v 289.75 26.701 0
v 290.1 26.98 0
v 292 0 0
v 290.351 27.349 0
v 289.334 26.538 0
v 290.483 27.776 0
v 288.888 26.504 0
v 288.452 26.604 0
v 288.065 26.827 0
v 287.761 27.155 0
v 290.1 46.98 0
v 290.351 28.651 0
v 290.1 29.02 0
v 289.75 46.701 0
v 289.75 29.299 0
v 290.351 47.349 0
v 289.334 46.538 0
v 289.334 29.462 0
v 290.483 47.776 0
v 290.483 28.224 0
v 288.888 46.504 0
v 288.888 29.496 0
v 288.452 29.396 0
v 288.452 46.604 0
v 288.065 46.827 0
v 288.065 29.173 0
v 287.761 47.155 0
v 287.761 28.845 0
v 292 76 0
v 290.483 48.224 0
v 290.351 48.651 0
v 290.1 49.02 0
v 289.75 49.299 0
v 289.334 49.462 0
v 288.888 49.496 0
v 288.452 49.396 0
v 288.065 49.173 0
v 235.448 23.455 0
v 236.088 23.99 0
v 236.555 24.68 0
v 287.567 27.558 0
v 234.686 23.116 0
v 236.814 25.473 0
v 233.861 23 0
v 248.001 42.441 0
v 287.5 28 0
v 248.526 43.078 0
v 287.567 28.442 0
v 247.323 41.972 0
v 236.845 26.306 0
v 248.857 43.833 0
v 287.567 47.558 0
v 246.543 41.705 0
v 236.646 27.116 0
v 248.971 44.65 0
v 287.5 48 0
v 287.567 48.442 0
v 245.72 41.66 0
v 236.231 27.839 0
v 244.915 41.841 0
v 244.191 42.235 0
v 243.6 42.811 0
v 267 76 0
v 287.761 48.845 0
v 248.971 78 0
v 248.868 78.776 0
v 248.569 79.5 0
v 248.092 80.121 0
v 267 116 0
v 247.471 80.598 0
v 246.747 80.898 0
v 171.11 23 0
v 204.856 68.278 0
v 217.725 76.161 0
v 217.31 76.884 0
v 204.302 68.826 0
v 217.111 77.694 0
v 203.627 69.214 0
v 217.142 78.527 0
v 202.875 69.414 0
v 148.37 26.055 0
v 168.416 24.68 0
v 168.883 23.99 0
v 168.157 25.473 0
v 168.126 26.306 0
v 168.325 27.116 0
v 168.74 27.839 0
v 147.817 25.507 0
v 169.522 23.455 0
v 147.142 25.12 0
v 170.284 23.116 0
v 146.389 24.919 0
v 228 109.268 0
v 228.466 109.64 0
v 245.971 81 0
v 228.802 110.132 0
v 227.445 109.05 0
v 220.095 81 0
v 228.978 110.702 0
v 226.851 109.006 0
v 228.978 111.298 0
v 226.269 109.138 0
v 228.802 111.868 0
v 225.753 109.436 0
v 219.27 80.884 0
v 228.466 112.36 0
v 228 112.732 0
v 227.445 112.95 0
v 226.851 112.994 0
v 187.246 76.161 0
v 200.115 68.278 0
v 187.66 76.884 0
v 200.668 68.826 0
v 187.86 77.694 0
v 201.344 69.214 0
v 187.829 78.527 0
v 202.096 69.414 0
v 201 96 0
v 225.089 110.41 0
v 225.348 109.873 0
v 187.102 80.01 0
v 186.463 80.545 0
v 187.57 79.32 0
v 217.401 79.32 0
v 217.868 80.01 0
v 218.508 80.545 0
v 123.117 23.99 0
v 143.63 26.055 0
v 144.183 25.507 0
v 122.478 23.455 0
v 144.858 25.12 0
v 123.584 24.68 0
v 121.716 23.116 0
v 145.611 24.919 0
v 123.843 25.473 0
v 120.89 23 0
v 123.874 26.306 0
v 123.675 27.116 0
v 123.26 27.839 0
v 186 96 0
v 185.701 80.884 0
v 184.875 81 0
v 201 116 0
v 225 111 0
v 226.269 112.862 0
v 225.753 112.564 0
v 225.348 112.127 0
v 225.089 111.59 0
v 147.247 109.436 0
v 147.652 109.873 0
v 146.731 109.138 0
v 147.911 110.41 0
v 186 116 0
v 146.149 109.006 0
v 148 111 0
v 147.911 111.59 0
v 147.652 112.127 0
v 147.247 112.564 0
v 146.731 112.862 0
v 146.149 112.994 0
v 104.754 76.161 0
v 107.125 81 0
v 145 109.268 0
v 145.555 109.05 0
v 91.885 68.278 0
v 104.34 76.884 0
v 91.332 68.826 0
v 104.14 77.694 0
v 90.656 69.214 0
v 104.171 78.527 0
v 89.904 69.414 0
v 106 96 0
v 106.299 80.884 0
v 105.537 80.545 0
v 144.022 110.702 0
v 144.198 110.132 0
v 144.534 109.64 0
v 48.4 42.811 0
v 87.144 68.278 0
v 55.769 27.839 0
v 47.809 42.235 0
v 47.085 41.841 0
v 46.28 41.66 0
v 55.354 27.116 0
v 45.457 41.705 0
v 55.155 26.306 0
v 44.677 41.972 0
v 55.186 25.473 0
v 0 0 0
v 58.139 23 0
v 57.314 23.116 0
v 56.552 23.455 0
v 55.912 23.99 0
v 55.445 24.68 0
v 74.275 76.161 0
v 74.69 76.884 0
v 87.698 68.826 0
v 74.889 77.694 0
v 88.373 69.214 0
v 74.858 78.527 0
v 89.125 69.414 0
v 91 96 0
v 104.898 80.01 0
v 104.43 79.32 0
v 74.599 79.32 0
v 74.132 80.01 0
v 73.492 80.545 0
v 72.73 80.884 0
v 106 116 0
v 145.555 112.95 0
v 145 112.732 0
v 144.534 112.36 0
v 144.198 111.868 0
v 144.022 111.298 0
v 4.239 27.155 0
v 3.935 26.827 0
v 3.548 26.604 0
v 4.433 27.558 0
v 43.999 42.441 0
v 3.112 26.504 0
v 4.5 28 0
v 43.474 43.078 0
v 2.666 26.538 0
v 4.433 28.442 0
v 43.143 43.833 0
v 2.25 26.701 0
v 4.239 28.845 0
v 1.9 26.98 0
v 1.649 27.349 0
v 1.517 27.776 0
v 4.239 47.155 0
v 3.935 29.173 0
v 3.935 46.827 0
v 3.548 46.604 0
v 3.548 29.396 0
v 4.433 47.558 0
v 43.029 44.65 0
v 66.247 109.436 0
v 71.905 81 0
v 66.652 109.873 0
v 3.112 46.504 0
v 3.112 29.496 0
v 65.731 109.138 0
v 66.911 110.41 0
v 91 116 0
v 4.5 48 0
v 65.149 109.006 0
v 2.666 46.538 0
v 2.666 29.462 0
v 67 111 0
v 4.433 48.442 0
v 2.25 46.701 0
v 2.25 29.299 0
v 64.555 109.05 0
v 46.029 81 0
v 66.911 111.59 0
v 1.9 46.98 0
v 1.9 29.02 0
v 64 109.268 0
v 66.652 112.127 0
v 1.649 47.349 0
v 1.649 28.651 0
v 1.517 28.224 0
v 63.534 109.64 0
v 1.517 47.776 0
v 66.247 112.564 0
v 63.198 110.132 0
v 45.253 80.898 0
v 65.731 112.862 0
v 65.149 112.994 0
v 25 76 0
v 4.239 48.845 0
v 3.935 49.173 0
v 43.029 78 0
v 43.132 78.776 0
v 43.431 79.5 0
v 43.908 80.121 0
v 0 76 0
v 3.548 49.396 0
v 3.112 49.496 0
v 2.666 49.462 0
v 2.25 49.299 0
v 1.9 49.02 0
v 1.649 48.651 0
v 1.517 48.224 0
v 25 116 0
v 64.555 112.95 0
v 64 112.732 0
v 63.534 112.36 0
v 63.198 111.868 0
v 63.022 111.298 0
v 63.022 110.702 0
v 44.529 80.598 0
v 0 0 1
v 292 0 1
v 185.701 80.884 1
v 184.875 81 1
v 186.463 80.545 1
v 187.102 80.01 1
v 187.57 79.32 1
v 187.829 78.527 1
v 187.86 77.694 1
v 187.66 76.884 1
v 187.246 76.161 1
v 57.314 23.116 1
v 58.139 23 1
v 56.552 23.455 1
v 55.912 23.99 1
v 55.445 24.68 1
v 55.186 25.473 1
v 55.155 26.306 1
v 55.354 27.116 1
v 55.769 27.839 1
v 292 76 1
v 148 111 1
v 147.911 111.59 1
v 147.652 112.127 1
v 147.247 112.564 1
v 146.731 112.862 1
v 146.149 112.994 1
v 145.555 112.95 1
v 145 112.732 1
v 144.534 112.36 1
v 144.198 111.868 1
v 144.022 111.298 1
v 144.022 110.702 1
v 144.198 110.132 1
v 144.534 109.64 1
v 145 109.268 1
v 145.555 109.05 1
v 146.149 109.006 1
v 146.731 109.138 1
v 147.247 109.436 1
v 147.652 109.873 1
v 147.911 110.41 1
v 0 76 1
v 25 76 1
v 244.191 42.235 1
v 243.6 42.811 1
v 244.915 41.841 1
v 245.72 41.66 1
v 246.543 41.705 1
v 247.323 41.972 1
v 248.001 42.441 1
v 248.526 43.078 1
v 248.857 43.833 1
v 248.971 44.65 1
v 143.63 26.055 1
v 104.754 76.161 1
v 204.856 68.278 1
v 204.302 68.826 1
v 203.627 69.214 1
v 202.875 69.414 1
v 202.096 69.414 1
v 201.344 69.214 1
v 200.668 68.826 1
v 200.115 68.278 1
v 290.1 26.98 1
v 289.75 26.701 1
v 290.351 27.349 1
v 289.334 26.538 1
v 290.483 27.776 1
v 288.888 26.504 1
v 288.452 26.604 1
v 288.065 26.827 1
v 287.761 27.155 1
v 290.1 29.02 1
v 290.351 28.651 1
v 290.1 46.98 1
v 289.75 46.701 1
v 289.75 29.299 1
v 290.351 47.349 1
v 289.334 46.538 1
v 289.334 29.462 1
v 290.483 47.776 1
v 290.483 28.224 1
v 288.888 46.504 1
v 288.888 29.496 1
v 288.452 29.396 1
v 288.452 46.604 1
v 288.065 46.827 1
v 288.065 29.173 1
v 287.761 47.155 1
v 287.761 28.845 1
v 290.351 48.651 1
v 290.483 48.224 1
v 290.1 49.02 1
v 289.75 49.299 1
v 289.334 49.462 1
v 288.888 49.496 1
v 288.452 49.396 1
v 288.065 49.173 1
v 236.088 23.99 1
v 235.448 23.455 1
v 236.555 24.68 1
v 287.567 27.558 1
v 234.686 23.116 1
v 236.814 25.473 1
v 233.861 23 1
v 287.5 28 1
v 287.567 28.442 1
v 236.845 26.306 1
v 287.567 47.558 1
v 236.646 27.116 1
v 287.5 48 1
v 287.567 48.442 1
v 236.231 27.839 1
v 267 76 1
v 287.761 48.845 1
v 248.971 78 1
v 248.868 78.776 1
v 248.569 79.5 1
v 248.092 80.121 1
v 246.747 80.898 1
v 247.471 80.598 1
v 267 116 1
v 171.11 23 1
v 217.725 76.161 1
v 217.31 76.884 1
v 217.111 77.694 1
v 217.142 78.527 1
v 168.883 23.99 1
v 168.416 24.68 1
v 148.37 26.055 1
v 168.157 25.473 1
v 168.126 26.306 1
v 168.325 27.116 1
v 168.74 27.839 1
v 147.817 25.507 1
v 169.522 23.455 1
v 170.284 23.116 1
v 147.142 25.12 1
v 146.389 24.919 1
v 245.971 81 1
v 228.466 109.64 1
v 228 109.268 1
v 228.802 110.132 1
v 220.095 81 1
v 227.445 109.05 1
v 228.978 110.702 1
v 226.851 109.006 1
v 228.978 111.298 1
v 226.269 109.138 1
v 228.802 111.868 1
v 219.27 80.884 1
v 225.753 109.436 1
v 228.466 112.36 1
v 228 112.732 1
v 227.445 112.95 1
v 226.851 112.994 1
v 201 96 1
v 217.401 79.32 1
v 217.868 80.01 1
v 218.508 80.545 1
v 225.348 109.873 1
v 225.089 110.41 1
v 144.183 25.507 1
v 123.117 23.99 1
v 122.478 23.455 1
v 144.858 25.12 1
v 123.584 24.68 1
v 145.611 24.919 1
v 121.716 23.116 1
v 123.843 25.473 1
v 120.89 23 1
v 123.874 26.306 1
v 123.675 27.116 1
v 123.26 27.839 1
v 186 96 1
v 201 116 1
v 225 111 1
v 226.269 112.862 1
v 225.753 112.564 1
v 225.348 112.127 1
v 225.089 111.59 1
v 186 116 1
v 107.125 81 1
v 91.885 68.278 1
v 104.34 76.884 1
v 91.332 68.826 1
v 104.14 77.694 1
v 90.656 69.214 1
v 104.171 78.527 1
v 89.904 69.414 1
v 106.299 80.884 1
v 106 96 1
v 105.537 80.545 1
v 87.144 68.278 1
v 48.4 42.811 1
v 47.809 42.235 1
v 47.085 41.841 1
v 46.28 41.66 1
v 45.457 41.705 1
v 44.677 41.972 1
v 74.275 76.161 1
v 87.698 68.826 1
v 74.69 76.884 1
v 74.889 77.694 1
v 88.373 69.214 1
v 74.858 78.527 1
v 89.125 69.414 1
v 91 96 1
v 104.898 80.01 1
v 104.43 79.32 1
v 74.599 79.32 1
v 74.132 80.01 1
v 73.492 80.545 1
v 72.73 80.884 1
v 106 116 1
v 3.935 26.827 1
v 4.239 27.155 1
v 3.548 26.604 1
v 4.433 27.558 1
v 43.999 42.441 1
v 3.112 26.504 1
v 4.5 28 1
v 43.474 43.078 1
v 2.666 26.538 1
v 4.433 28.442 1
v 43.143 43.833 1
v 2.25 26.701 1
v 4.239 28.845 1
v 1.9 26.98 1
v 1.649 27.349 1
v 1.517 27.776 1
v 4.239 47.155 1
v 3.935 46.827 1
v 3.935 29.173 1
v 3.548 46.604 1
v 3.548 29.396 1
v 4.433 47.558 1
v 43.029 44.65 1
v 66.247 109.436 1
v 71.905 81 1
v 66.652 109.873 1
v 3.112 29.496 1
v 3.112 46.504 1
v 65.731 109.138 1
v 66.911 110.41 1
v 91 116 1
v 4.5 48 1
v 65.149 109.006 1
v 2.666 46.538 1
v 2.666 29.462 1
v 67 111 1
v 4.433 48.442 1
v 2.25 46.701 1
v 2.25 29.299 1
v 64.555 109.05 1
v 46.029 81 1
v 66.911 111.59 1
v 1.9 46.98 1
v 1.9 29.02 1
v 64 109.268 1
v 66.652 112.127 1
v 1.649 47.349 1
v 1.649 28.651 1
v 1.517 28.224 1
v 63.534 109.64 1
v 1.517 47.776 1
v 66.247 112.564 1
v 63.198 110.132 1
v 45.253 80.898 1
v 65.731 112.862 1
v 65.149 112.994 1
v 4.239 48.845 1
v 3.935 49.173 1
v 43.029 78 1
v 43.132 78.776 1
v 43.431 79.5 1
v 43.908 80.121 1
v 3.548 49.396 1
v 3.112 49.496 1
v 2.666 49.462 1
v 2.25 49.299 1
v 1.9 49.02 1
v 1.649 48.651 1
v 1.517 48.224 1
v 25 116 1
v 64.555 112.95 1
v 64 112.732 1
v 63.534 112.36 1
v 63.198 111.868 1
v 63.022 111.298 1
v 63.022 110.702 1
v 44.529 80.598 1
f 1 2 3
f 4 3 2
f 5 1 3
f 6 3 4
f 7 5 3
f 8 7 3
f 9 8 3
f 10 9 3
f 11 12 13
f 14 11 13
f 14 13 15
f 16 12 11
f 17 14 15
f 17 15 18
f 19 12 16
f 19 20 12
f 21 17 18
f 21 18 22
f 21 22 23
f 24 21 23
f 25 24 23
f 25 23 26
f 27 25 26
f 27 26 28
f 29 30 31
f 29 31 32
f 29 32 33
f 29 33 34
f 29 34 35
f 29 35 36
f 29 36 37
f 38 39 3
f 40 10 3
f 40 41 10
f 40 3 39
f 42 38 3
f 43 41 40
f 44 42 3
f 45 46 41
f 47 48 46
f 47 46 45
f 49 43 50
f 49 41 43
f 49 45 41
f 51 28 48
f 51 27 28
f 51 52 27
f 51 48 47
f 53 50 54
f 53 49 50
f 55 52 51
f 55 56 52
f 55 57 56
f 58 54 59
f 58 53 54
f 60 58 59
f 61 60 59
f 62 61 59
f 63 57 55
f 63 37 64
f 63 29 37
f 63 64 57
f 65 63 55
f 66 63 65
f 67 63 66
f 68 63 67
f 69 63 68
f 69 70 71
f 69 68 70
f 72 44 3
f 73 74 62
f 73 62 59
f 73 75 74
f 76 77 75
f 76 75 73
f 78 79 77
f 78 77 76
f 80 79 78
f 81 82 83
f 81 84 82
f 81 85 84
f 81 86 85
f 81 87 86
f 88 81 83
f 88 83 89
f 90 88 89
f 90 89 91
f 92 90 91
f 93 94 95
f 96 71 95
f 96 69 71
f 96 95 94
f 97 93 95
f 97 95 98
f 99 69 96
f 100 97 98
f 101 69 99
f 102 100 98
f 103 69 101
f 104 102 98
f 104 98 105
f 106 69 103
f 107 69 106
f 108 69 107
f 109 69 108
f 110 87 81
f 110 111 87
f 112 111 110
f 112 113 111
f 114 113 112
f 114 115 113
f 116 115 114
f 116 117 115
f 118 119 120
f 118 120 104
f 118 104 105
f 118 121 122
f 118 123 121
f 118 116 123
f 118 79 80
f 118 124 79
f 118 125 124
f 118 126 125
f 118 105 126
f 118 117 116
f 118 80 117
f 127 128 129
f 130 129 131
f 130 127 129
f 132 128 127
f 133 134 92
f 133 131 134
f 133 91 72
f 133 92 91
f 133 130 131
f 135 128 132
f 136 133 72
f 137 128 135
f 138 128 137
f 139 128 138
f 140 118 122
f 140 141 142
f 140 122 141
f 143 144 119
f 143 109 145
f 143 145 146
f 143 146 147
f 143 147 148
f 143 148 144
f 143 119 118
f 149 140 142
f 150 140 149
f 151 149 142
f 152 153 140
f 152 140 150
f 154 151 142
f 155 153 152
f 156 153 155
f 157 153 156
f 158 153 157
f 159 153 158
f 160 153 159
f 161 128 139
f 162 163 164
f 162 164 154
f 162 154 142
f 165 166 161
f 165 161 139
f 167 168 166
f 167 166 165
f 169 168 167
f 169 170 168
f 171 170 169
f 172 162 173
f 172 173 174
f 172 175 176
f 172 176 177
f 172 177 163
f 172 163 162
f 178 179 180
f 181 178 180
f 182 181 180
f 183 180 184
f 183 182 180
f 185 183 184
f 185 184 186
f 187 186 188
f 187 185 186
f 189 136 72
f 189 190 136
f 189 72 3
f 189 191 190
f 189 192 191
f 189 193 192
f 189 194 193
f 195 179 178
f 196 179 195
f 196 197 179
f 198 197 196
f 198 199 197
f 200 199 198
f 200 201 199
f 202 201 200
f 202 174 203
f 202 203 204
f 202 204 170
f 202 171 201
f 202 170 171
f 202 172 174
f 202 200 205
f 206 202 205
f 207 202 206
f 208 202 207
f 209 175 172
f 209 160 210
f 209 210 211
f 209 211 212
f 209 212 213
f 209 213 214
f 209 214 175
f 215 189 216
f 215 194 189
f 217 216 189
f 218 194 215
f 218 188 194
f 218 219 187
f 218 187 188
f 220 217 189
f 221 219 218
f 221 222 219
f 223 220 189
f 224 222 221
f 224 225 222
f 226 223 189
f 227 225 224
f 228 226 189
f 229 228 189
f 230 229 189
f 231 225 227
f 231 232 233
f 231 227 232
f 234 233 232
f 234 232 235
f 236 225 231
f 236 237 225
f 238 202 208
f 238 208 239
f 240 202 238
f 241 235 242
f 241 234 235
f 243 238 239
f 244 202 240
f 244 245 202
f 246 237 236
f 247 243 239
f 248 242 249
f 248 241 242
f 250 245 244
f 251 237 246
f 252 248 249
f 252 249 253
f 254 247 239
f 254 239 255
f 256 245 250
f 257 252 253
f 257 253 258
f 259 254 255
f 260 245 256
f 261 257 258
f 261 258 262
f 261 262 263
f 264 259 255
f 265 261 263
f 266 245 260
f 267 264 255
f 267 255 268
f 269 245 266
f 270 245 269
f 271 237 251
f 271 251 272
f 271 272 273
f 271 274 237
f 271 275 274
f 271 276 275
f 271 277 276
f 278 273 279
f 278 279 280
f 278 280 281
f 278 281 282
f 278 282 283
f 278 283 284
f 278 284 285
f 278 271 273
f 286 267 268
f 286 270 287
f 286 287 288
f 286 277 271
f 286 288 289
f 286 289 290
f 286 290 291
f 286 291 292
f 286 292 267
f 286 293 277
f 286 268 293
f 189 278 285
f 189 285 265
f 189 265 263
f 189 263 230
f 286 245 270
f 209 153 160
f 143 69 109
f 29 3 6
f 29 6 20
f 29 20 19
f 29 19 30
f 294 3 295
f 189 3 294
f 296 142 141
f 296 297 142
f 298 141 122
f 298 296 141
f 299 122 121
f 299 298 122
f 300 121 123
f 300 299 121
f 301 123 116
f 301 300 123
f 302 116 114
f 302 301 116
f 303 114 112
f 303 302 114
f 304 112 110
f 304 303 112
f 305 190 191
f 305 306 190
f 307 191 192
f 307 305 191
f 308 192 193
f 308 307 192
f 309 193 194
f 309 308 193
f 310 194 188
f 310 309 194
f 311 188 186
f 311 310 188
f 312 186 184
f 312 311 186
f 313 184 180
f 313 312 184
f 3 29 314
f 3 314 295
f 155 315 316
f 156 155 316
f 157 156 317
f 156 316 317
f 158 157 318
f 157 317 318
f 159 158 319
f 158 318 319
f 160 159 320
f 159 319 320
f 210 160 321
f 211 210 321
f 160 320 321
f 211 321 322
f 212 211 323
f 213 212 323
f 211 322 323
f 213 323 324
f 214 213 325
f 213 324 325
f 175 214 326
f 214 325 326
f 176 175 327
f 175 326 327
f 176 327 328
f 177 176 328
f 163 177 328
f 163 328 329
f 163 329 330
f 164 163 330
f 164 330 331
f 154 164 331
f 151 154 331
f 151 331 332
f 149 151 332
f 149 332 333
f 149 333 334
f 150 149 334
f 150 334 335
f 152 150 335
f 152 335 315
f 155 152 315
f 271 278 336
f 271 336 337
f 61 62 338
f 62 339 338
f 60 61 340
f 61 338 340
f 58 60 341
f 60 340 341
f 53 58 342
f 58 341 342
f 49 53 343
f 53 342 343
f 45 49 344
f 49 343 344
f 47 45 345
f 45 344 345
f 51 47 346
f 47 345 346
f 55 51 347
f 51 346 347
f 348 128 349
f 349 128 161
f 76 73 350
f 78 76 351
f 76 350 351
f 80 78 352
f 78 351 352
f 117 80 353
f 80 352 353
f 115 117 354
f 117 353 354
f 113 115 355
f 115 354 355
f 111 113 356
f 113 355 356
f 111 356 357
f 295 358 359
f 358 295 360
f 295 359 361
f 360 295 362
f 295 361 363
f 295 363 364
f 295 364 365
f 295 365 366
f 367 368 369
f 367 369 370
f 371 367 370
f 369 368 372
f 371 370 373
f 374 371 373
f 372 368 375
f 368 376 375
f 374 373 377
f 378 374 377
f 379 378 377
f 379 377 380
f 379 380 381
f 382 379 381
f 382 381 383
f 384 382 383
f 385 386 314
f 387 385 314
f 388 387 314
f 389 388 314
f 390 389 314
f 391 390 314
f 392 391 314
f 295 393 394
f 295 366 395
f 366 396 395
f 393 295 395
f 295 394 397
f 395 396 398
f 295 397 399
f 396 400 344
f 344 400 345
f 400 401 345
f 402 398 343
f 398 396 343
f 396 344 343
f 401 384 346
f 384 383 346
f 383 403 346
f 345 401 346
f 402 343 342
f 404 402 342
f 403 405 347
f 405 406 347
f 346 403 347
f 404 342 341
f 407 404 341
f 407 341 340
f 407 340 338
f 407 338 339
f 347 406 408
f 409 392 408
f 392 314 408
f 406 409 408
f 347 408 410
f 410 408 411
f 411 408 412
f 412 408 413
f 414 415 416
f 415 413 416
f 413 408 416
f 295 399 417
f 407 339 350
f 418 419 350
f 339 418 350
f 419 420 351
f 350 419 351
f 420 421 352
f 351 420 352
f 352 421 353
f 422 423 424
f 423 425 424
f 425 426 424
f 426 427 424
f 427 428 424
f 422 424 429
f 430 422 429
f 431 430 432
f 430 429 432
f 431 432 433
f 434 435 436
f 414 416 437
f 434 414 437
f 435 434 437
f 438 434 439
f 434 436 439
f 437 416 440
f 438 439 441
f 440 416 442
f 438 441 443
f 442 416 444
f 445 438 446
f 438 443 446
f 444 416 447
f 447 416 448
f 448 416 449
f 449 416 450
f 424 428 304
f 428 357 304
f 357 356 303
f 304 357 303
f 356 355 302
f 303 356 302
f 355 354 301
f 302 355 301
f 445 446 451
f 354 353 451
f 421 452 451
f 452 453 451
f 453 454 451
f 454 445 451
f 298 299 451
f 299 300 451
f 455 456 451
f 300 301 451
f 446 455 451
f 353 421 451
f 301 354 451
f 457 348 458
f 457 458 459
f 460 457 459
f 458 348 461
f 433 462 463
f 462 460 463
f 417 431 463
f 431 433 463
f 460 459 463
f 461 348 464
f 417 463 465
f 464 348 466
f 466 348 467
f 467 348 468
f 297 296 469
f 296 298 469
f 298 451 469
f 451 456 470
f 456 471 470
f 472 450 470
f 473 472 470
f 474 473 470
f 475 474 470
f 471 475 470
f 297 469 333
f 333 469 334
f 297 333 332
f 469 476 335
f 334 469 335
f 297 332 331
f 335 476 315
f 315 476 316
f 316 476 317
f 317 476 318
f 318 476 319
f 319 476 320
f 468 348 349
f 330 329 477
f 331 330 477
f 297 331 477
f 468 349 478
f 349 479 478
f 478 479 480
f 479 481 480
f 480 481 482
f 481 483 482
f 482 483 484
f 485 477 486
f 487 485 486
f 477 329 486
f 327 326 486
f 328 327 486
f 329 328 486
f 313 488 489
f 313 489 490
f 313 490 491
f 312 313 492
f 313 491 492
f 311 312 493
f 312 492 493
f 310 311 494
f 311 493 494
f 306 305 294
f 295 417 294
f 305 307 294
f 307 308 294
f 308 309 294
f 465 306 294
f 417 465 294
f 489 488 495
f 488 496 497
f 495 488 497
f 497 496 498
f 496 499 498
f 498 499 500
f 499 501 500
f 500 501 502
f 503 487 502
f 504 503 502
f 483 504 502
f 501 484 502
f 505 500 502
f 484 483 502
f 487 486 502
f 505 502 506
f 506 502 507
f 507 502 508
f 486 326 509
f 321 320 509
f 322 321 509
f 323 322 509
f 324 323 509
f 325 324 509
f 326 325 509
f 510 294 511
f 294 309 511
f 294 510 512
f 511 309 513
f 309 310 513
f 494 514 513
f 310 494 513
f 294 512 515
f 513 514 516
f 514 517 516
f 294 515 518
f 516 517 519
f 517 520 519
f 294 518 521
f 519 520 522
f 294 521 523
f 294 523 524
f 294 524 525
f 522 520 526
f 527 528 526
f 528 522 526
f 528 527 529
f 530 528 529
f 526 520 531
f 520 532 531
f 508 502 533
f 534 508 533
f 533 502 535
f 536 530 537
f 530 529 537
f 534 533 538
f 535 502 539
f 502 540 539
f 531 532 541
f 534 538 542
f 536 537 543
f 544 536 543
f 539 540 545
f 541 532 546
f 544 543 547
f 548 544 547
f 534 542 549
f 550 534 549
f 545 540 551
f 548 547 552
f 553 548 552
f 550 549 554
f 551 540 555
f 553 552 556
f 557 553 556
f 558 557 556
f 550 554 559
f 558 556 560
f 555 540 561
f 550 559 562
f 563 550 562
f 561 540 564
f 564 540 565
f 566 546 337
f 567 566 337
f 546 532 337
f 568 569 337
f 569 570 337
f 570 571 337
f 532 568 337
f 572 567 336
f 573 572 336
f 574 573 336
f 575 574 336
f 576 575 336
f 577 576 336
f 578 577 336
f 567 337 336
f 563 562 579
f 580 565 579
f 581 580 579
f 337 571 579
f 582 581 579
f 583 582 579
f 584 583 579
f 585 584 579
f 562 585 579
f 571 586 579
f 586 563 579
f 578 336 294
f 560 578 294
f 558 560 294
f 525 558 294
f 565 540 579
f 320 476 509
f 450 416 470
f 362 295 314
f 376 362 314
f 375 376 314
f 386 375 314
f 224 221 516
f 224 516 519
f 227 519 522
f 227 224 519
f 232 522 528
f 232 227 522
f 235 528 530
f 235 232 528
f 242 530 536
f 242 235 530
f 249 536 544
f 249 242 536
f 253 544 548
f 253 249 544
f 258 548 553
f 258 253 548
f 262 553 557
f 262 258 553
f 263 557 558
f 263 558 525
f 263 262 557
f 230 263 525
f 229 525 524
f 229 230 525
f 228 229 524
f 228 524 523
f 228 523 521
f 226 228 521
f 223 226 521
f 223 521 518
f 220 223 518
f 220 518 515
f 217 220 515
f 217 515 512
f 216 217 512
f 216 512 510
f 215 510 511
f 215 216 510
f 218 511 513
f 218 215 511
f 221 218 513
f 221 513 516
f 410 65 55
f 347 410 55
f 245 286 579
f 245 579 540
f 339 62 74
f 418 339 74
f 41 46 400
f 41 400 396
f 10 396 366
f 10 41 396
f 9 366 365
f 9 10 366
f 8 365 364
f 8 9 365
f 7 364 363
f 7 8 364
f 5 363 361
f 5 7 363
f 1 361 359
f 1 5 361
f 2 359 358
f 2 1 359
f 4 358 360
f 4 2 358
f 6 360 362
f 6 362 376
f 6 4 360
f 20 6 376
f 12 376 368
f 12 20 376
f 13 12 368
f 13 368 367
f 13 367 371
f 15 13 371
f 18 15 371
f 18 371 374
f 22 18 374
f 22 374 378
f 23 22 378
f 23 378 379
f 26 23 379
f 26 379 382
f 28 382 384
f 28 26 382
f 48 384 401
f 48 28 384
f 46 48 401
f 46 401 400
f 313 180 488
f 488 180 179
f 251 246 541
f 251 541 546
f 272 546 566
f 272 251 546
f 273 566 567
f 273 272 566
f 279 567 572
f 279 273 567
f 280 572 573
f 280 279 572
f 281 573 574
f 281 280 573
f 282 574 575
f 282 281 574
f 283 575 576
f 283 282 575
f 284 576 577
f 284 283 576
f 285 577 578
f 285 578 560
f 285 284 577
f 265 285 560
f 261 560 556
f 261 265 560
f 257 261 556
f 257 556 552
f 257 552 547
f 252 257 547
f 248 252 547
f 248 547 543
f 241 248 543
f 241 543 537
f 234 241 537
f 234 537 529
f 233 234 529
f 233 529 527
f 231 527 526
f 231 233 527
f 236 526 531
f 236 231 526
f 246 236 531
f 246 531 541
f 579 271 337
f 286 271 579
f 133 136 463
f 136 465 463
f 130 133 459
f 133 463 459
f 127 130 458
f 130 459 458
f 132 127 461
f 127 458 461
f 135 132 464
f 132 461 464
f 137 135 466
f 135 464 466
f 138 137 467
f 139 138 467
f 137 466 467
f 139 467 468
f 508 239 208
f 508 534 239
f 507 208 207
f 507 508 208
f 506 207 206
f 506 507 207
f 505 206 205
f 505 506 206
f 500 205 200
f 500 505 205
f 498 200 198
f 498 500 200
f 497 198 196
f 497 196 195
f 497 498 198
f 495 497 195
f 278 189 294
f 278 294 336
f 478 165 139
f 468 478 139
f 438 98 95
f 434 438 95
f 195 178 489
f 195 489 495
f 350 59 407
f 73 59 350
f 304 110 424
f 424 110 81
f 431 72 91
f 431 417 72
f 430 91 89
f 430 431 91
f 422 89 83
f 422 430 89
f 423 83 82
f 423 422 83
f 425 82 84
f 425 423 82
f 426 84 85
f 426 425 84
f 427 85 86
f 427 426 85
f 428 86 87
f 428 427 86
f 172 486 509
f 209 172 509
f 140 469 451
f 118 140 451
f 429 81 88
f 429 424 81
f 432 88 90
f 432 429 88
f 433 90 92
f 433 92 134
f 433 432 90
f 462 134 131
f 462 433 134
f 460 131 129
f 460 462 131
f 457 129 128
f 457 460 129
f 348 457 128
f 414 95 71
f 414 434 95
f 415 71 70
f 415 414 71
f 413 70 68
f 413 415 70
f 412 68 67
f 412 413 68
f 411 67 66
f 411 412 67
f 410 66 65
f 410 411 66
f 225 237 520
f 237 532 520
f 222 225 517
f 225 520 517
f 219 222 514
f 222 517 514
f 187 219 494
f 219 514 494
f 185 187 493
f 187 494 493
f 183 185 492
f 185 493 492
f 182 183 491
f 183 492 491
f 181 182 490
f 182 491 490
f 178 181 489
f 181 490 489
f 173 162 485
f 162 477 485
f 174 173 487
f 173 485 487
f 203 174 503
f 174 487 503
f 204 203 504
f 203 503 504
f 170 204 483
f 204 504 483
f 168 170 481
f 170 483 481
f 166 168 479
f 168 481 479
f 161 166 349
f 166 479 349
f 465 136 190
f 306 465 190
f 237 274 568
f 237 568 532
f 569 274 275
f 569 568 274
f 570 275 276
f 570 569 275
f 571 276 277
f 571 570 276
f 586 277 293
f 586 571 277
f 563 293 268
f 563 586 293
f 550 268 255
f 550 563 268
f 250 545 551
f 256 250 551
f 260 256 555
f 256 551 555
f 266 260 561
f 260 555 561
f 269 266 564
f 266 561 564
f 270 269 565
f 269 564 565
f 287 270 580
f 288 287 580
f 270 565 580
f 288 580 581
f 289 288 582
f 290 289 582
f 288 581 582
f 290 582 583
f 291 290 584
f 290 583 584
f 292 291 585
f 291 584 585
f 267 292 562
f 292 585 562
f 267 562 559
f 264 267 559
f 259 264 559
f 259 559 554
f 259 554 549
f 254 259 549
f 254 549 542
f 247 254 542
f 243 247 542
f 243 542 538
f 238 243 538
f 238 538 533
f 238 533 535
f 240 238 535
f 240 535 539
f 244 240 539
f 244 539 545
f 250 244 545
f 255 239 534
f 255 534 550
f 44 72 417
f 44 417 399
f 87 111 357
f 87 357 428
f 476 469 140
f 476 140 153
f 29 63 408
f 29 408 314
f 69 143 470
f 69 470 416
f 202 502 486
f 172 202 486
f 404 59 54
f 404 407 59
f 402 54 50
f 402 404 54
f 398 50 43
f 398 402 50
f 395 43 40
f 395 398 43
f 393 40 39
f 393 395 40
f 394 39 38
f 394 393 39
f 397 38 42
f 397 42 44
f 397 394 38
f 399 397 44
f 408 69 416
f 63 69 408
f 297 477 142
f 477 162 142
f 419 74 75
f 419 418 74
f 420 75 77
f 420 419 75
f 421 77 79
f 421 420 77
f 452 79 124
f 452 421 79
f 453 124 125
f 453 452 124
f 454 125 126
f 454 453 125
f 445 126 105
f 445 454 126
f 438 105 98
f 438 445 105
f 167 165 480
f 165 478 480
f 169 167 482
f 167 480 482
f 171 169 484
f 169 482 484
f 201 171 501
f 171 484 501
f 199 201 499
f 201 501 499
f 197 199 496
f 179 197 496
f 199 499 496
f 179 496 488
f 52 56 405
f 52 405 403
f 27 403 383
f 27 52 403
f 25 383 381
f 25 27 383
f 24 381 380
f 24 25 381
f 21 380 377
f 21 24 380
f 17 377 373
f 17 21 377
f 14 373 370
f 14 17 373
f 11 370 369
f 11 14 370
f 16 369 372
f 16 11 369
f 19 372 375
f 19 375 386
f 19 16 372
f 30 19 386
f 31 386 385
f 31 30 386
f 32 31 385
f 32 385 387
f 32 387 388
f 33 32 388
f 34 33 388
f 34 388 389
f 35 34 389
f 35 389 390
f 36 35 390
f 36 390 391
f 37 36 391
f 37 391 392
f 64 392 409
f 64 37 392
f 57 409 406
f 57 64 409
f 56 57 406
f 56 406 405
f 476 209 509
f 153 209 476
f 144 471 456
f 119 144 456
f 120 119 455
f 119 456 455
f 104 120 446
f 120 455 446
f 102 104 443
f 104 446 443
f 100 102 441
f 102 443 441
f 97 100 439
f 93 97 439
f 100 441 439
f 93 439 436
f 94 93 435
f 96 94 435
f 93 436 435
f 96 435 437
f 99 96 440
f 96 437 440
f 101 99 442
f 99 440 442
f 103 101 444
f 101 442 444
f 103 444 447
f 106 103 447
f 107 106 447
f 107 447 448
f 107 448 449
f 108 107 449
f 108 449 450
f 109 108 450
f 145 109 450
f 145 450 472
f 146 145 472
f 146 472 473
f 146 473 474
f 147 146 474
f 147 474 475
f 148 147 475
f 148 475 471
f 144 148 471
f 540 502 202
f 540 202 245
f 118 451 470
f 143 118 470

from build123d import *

# Parameters (mm, degrees)
SKETCH_1_R          = 1.5
EXTRUDE_1_DEPTH     = 1
SKETCH_2_R          = 2
SKETCH_2_W          = 15
SKETCH_2_H          = 20
CUT_EXTRUDE_1_DEPTH = 315.198981539
CUT_EXTRUDE_2_REACH = 316.199
FILLET_1_R          = 3


with BuildPart() as part:
    # 草图1 → 凸台-拉伸1 (new body)
    with BuildSketch(Plane.XY):
        Polygon((0, 0), (0, 76), (25, 76), (25, 116), (267, 116), (267, 76), (292, 76), (292, 0), align=None)
        with Locations((3, 48)):
            Circle(SKETCH_1_R, mode=Mode.SUBTRACT)
        with Locations((3, 28)):
            Circle(SKETCH_1_R, mode=Mode.SUBTRACT)
        with Locations(Location((289, 28, 0), (0, 0, 180))):
            Circle(SKETCH_1_R, mode=Mode.SUBTRACT)
        with Locations(Location((289, 48, 0), (0, 0, 180))):
            Circle(SKETCH_1_R, mode=Mode.SUBTRACT)
    extrude(amount=EXTRUDE_1_DEPTH)

    # 草图2 → 切除-拉伸1 (cut, through all)
    with BuildSketch(Plane.XY.offset(1)):
        with Locations((65, 111)):
            Circle(SKETCH_2_R)
        with Locations(Location((227, 111, 0), (0, 0, 180))):
            Circle(SKETCH_2_R)
        with Locations((146, 111)):
            Circle(SKETCH_2_R)
        with Locations((193.5, 106)):
            Rectangle(SKETCH_2_W, SKETCH_2_H)
        with Locations((98.5, 106)):
            Rectangle(SKETCH_2_W, SKETCH_2_H)
    extrude(amount=-CUT_EXTRUDE_1_DEPTH, mode=Mode.SUBTRACT)

    # 草图3 → 切除-拉伸2 (cut, up to next)
    with BuildSketch(Plane(origin=(0, 0, 0), x_dir=(-1, 0, 0), z_dir=(0, 0, -1)), mode=Mode.PRIVATE) as cut_extrude_2_sk1:
        Polygon((-43.02940934, 35.888888889), (-78.02940934, 81), (-43.02940934, 81), align=None)
    cut_extrude_2_tool1 = extrude(cut_extrude_2_sk1.sketch, amount=-CUT_EXTRUDE_2_REACH, mode=Mode.PRIVATE) & part.part
    # 草图3 → 切除-拉伸2 (cut, up to next)
    with BuildSketch(Plane(origin=(0, 0, 0), x_dir=(-1, 0, 0), z_dir=(0, 0, -1)), mode=Mode.PRIVATE) as cut_extrude_2_sk2:
        Polygon((-127.01470467, 23), (-52.01470467, 23), (-89.51470467, 71.333333333), align=None)
    cut_extrude_2_tool2 = extrude(cut_extrude_2_sk2.sketch, amount=-CUT_EXTRUDE_2_REACH, mode=Mode.PRIVATE) & part.part
    # 草图3 → 切除-拉伸2 (cut, up to next)
    with BuildSketch(Plane(origin=(0, 0, 0), x_dir=(-1, 0, 0), z_dir=(0, 0, -1)), mode=Mode.PRIVATE) as cut_extrude_2_sk3:
        Polygon((-101, 81), (-146, 81), (-146, 23), align=None)
    cut_extrude_2_tool3 = extrude(cut_extrude_2_sk3.sketch, amount=-CUT_EXTRUDE_2_REACH, mode=Mode.PRIVATE) & part.part
    # 草图3 → 切除-拉伸2 (cut, up to next)
    with BuildSketch(Plane(origin=(0, 0, 0), x_dir=(-1, 0, 0), z_dir=(0, 0, -1)), mode=Mode.PRIVATE) as cut_extrude_2_sk4:
        Polygon((-202.48529533, 71.333333333), (-164.98529533, 23), (-239.98529533, 23), align=None)
    cut_extrude_2_tool4 = extrude(cut_extrude_2_sk4.sketch, amount=-CUT_EXTRUDE_2_REACH, mode=Mode.PRIVATE) & part.part
    # 草图3 → 切除-拉伸2 (cut, up to next)
    with BuildSketch(Plane(origin=(0, 0, 0), x_dir=(-1, 0, 0), z_dir=(0, 0, -1)), mode=Mode.PRIVATE) as cut_extrude_2_sk5:
        Polygon((-146, 81), (-191, 81), (-146, 23), align=None)
    cut_extrude_2_tool5 = extrude(cut_extrude_2_sk5.sketch, amount=-CUT_EXTRUDE_2_REACH, mode=Mode.PRIVATE) & part.part
    # 草图3 → 切除-拉伸2 (cut, up to next)
    with BuildSketch(Plane(origin=(0, 0, 0), x_dir=(-1, 0, 0), z_dir=(0, 0, -1)), mode=Mode.PRIVATE) as cut_extrude_2_sk6:
        Polygon((-248.97059066, 35.888888889), (-213.97059066, 81), (-248.97059066, 81), align=None)
    cut_extrude_2_tool6 = extrude(cut_extrude_2_sk6.sketch, amount=-CUT_EXTRUDE_2_REACH, mode=Mode.PRIVATE) & part.part
    add(cut_extrude_2_tool1.solids().sort_by_distance((54.696076, 65.962963, 0))[0], mode=Mode.SUBTRACT)
    add(cut_extrude_2_tool2.solids().sort_by_distance((89.514705, 39.111111, 0))[0], mode=Mode.SUBTRACT)
    add(cut_extrude_2_tool3.solids().sort_by_distance((131, 61.666667, 0))[0], mode=Mode.SUBTRACT)
    add(cut_extrude_2_tool4.solids().sort_by_distance((202.485295, 39.111111, 0))[0], mode=Mode.SUBTRACT)
    add(cut_extrude_2_tool5.solids().sort_by_distance((161, 61.666667, 0))[0], mode=Mode.SUBTRACT)
    add(cut_extrude_2_tool6.solids().sort_by_distance((237.303924, 65.962963, 0))[0], mode=Mode.SUBTRACT)

    # 圆角1
    fillet_1_edges = [part.edges().sort_by_distance(p)[0] for p in [
        (52.01470467, 23, 0.5),
        (127.01470467, 23, 0.5),
        (89.51470467, 71.333333333, 0.5),
        (202.48529533, 71.333333333, 0.5),
        (164.98529533, 23, 0.5),
        (239.98529533, 23, 0.5),
        (191, 81, 0.5),
        (101, 81, 0.5),
        (146, 23, 0.5),
        (213.97059066, 81, 0.5),
        (248.97059066, 35.888888889, 0.5),
        (248.97059066, 81, 0.5),
        (43.02940934, 35.888888889, 0.5),
        (78.02940934, 81, 0.5),
        (43.02940934, 81, 0.5),
    ]]
    fillet(fillet_1_edges, radius=FILLET_1_R)


solid = part.part
